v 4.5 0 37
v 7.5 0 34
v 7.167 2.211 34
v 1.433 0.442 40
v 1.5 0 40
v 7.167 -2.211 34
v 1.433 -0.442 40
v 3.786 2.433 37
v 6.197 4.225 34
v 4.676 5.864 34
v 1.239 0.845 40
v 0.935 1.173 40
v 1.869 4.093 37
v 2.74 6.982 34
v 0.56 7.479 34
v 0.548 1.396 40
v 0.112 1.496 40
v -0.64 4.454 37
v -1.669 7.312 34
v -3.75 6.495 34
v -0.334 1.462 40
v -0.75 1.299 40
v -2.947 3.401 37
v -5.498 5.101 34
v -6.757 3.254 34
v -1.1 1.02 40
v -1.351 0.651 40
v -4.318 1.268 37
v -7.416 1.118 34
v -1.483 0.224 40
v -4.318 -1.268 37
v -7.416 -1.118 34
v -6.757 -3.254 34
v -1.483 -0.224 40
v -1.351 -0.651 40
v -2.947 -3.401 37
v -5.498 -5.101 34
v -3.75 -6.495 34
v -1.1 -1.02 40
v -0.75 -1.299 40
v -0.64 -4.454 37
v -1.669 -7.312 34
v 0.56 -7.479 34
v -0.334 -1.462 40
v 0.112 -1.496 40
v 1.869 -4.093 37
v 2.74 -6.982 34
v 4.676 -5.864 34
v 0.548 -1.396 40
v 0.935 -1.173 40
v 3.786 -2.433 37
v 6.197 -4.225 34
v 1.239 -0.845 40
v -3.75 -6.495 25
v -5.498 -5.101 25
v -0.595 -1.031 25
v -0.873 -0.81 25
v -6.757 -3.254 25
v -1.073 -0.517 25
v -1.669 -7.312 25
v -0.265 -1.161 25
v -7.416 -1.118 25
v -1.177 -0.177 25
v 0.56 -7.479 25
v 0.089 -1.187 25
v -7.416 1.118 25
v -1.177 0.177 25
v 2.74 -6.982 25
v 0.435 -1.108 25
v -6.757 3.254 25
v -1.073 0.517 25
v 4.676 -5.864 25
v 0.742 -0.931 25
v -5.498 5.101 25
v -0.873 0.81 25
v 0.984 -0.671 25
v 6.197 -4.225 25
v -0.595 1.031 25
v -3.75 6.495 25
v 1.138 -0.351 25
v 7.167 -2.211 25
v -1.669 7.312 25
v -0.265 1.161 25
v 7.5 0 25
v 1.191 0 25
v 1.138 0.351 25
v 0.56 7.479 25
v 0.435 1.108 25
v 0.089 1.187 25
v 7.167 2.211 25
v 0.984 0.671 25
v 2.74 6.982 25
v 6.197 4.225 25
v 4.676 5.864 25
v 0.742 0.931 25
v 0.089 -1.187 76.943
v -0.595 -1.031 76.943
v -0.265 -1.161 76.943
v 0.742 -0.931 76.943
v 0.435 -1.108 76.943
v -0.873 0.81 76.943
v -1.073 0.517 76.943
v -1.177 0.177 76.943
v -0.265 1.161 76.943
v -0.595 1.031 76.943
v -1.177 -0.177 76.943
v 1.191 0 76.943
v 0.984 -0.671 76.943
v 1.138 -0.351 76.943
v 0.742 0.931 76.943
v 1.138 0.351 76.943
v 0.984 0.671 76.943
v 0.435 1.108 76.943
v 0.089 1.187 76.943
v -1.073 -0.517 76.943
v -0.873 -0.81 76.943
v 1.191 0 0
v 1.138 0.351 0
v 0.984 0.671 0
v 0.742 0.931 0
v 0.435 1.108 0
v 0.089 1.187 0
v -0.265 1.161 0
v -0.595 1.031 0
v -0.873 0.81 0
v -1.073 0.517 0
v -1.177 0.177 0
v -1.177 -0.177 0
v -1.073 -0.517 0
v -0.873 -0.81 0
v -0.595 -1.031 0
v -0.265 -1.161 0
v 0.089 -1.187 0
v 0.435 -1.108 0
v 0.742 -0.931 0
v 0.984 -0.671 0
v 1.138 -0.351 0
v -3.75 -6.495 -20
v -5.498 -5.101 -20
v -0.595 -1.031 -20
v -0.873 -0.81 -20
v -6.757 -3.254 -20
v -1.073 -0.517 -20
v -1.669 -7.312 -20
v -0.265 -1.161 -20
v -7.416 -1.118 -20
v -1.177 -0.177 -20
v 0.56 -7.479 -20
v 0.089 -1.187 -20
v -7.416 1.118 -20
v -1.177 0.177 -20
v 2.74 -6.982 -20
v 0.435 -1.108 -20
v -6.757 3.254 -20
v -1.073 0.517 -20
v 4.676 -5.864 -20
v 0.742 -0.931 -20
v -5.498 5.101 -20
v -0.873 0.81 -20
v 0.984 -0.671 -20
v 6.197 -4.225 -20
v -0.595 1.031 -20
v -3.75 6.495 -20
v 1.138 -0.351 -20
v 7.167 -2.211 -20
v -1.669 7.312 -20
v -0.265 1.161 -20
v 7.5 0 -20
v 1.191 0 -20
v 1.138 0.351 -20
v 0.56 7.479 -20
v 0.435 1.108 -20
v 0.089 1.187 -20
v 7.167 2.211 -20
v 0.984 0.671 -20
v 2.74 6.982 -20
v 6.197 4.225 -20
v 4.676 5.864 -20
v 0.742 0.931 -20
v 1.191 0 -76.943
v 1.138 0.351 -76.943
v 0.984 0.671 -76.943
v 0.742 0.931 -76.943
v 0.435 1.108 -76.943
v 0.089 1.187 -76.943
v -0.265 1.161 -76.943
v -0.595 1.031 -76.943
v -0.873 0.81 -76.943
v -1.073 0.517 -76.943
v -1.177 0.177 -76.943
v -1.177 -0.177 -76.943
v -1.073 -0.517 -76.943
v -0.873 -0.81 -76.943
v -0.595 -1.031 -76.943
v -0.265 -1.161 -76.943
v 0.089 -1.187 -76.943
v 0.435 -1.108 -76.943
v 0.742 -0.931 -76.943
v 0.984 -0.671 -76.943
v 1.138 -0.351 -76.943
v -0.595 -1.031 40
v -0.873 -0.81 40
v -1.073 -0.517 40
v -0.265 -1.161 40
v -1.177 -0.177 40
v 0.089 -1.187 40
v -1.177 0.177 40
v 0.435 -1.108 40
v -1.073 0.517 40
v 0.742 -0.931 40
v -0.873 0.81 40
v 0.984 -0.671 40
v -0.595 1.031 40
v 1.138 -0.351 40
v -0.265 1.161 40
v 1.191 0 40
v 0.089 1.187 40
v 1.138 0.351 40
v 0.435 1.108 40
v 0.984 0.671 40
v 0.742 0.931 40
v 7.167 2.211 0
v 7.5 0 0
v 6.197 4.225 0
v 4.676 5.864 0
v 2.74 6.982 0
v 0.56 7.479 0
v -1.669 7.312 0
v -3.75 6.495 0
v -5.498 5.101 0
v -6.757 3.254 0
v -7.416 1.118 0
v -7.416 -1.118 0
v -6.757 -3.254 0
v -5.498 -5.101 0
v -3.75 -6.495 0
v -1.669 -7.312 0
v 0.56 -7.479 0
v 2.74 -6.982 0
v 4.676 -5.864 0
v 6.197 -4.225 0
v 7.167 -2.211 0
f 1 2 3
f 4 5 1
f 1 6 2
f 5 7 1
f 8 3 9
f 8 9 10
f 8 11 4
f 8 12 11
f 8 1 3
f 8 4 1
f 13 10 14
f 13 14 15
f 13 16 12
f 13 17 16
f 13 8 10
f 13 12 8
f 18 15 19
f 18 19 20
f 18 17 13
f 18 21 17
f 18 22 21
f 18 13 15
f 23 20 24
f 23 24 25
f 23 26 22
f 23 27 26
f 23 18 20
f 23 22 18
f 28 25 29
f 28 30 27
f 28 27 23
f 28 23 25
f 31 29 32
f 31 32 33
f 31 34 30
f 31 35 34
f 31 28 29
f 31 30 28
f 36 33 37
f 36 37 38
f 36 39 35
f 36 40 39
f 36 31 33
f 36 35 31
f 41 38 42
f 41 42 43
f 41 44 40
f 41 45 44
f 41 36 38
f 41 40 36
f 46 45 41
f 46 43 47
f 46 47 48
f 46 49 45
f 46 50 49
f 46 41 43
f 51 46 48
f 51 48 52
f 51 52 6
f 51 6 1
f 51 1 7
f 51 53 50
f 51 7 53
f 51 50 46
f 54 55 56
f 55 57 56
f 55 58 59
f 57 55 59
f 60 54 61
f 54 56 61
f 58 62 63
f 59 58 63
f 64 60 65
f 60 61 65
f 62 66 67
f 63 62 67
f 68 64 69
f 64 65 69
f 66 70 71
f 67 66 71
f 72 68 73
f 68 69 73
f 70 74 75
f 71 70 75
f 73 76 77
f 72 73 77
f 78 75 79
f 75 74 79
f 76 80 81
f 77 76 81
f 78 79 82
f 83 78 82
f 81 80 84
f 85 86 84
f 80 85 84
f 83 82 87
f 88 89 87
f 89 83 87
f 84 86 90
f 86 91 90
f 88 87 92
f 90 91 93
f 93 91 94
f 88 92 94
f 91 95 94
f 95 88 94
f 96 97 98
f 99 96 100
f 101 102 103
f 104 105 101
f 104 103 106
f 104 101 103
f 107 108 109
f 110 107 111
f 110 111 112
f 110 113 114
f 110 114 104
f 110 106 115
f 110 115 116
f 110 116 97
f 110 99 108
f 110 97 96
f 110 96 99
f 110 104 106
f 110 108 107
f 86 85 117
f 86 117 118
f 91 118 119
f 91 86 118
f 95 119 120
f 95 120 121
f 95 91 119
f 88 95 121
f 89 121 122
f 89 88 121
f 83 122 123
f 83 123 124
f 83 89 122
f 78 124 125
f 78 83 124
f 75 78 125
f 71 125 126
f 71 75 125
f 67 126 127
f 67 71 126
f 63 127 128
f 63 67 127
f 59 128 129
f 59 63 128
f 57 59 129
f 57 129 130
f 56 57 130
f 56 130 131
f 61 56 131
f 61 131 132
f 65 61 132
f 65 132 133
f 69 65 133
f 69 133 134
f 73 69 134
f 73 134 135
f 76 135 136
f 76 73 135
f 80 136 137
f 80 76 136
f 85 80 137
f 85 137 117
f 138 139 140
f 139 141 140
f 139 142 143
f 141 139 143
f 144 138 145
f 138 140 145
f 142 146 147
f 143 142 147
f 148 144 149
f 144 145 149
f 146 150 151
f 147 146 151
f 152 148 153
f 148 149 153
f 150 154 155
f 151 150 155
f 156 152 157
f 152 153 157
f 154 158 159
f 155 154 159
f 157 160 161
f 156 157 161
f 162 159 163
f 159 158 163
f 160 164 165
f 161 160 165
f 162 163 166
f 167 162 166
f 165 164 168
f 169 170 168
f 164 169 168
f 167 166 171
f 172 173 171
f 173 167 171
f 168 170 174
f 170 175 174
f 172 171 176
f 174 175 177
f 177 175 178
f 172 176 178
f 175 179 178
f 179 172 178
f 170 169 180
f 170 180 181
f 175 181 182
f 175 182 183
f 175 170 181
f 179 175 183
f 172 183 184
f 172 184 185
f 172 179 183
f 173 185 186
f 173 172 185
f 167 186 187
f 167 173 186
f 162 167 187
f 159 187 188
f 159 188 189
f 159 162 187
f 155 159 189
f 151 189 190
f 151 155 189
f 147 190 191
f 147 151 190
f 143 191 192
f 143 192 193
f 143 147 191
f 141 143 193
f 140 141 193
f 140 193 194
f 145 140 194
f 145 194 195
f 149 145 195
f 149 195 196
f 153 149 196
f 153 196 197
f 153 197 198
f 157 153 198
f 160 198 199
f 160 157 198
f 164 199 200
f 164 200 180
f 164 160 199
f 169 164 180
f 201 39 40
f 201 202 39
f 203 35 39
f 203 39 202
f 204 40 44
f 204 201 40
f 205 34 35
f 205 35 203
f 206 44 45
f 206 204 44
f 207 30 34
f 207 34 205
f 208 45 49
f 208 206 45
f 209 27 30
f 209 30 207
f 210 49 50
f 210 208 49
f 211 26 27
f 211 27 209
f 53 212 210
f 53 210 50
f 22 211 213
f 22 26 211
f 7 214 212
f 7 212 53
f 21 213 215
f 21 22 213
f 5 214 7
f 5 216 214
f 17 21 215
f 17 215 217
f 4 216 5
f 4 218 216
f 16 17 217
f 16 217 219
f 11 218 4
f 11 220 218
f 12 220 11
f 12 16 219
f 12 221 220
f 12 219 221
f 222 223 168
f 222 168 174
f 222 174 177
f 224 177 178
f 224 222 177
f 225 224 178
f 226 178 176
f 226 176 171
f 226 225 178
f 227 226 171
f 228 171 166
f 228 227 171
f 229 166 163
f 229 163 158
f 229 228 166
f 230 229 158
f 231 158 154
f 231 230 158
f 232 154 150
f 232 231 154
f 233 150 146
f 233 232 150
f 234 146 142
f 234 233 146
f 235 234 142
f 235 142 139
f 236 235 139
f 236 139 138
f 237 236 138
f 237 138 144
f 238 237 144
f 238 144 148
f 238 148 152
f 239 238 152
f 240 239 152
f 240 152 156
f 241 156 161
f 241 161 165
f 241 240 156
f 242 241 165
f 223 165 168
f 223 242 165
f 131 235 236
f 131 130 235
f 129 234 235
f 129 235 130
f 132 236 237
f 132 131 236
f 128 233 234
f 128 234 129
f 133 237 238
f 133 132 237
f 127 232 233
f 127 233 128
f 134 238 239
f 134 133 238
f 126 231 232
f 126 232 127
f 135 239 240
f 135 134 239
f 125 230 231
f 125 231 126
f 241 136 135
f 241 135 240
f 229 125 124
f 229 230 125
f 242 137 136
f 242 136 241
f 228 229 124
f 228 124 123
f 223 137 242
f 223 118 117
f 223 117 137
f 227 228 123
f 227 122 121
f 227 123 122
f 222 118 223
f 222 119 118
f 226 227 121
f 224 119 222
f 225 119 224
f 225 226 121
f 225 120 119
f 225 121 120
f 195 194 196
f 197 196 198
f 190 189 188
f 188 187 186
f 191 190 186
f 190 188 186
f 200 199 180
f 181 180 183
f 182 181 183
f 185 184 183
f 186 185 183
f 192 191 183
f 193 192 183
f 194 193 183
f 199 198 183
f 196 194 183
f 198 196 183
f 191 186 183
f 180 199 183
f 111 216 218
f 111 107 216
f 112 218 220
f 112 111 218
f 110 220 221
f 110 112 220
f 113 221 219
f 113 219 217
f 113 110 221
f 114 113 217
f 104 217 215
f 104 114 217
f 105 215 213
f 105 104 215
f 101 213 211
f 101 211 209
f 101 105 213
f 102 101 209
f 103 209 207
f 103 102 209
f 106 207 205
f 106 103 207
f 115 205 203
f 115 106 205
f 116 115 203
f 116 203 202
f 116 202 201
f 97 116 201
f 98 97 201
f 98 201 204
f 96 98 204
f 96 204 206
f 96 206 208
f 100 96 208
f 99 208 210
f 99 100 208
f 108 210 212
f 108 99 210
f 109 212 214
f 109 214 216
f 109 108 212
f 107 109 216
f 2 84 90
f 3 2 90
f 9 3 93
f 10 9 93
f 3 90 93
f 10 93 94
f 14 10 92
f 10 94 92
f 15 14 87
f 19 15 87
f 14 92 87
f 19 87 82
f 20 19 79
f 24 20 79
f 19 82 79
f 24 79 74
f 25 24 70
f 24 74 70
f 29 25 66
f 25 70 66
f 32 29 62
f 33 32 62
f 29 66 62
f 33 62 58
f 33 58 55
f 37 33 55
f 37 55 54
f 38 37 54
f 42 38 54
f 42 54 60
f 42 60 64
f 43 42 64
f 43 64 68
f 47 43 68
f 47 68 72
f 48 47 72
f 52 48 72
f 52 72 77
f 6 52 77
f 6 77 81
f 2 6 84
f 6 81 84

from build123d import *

# Parameters (mm, degrees)
F0_R     = 7.5
F1_DEPTH = 20
F2_R     = 1.190625
F3_DEPTH = 76.94342
F5_R     = 7.5
F6_DEPTH = 15
F7_SIZE  = 6


with BuildPart() as f1:
    # F0 (on Top) → F1 (new body)
    with BuildSketch(Plane.XY):
        Circle(F0_R)
    extrude(amount=-F1_DEPTH)

    # F2 (on Top) → F3 (join, symmetric)
    with BuildSketch(Plane.XY):
        Circle(F2_R)
    extrude(amount=F3_DEPTH, both=True)

    # F5 (on offset) → F6 (join)
    with BuildSketch(Plane.XY.offset(25)):
        Circle(F5_R)
    extrude(amount=F6_DEPTH)

    # F7
    f7_edges = [f1.edges().sort_by_distance(p)[0] for p in [
        (-7.5, 0, 40),
    ]]
    chamfer(f7_edges, length=F7_SIZE)


solid = f1.part
